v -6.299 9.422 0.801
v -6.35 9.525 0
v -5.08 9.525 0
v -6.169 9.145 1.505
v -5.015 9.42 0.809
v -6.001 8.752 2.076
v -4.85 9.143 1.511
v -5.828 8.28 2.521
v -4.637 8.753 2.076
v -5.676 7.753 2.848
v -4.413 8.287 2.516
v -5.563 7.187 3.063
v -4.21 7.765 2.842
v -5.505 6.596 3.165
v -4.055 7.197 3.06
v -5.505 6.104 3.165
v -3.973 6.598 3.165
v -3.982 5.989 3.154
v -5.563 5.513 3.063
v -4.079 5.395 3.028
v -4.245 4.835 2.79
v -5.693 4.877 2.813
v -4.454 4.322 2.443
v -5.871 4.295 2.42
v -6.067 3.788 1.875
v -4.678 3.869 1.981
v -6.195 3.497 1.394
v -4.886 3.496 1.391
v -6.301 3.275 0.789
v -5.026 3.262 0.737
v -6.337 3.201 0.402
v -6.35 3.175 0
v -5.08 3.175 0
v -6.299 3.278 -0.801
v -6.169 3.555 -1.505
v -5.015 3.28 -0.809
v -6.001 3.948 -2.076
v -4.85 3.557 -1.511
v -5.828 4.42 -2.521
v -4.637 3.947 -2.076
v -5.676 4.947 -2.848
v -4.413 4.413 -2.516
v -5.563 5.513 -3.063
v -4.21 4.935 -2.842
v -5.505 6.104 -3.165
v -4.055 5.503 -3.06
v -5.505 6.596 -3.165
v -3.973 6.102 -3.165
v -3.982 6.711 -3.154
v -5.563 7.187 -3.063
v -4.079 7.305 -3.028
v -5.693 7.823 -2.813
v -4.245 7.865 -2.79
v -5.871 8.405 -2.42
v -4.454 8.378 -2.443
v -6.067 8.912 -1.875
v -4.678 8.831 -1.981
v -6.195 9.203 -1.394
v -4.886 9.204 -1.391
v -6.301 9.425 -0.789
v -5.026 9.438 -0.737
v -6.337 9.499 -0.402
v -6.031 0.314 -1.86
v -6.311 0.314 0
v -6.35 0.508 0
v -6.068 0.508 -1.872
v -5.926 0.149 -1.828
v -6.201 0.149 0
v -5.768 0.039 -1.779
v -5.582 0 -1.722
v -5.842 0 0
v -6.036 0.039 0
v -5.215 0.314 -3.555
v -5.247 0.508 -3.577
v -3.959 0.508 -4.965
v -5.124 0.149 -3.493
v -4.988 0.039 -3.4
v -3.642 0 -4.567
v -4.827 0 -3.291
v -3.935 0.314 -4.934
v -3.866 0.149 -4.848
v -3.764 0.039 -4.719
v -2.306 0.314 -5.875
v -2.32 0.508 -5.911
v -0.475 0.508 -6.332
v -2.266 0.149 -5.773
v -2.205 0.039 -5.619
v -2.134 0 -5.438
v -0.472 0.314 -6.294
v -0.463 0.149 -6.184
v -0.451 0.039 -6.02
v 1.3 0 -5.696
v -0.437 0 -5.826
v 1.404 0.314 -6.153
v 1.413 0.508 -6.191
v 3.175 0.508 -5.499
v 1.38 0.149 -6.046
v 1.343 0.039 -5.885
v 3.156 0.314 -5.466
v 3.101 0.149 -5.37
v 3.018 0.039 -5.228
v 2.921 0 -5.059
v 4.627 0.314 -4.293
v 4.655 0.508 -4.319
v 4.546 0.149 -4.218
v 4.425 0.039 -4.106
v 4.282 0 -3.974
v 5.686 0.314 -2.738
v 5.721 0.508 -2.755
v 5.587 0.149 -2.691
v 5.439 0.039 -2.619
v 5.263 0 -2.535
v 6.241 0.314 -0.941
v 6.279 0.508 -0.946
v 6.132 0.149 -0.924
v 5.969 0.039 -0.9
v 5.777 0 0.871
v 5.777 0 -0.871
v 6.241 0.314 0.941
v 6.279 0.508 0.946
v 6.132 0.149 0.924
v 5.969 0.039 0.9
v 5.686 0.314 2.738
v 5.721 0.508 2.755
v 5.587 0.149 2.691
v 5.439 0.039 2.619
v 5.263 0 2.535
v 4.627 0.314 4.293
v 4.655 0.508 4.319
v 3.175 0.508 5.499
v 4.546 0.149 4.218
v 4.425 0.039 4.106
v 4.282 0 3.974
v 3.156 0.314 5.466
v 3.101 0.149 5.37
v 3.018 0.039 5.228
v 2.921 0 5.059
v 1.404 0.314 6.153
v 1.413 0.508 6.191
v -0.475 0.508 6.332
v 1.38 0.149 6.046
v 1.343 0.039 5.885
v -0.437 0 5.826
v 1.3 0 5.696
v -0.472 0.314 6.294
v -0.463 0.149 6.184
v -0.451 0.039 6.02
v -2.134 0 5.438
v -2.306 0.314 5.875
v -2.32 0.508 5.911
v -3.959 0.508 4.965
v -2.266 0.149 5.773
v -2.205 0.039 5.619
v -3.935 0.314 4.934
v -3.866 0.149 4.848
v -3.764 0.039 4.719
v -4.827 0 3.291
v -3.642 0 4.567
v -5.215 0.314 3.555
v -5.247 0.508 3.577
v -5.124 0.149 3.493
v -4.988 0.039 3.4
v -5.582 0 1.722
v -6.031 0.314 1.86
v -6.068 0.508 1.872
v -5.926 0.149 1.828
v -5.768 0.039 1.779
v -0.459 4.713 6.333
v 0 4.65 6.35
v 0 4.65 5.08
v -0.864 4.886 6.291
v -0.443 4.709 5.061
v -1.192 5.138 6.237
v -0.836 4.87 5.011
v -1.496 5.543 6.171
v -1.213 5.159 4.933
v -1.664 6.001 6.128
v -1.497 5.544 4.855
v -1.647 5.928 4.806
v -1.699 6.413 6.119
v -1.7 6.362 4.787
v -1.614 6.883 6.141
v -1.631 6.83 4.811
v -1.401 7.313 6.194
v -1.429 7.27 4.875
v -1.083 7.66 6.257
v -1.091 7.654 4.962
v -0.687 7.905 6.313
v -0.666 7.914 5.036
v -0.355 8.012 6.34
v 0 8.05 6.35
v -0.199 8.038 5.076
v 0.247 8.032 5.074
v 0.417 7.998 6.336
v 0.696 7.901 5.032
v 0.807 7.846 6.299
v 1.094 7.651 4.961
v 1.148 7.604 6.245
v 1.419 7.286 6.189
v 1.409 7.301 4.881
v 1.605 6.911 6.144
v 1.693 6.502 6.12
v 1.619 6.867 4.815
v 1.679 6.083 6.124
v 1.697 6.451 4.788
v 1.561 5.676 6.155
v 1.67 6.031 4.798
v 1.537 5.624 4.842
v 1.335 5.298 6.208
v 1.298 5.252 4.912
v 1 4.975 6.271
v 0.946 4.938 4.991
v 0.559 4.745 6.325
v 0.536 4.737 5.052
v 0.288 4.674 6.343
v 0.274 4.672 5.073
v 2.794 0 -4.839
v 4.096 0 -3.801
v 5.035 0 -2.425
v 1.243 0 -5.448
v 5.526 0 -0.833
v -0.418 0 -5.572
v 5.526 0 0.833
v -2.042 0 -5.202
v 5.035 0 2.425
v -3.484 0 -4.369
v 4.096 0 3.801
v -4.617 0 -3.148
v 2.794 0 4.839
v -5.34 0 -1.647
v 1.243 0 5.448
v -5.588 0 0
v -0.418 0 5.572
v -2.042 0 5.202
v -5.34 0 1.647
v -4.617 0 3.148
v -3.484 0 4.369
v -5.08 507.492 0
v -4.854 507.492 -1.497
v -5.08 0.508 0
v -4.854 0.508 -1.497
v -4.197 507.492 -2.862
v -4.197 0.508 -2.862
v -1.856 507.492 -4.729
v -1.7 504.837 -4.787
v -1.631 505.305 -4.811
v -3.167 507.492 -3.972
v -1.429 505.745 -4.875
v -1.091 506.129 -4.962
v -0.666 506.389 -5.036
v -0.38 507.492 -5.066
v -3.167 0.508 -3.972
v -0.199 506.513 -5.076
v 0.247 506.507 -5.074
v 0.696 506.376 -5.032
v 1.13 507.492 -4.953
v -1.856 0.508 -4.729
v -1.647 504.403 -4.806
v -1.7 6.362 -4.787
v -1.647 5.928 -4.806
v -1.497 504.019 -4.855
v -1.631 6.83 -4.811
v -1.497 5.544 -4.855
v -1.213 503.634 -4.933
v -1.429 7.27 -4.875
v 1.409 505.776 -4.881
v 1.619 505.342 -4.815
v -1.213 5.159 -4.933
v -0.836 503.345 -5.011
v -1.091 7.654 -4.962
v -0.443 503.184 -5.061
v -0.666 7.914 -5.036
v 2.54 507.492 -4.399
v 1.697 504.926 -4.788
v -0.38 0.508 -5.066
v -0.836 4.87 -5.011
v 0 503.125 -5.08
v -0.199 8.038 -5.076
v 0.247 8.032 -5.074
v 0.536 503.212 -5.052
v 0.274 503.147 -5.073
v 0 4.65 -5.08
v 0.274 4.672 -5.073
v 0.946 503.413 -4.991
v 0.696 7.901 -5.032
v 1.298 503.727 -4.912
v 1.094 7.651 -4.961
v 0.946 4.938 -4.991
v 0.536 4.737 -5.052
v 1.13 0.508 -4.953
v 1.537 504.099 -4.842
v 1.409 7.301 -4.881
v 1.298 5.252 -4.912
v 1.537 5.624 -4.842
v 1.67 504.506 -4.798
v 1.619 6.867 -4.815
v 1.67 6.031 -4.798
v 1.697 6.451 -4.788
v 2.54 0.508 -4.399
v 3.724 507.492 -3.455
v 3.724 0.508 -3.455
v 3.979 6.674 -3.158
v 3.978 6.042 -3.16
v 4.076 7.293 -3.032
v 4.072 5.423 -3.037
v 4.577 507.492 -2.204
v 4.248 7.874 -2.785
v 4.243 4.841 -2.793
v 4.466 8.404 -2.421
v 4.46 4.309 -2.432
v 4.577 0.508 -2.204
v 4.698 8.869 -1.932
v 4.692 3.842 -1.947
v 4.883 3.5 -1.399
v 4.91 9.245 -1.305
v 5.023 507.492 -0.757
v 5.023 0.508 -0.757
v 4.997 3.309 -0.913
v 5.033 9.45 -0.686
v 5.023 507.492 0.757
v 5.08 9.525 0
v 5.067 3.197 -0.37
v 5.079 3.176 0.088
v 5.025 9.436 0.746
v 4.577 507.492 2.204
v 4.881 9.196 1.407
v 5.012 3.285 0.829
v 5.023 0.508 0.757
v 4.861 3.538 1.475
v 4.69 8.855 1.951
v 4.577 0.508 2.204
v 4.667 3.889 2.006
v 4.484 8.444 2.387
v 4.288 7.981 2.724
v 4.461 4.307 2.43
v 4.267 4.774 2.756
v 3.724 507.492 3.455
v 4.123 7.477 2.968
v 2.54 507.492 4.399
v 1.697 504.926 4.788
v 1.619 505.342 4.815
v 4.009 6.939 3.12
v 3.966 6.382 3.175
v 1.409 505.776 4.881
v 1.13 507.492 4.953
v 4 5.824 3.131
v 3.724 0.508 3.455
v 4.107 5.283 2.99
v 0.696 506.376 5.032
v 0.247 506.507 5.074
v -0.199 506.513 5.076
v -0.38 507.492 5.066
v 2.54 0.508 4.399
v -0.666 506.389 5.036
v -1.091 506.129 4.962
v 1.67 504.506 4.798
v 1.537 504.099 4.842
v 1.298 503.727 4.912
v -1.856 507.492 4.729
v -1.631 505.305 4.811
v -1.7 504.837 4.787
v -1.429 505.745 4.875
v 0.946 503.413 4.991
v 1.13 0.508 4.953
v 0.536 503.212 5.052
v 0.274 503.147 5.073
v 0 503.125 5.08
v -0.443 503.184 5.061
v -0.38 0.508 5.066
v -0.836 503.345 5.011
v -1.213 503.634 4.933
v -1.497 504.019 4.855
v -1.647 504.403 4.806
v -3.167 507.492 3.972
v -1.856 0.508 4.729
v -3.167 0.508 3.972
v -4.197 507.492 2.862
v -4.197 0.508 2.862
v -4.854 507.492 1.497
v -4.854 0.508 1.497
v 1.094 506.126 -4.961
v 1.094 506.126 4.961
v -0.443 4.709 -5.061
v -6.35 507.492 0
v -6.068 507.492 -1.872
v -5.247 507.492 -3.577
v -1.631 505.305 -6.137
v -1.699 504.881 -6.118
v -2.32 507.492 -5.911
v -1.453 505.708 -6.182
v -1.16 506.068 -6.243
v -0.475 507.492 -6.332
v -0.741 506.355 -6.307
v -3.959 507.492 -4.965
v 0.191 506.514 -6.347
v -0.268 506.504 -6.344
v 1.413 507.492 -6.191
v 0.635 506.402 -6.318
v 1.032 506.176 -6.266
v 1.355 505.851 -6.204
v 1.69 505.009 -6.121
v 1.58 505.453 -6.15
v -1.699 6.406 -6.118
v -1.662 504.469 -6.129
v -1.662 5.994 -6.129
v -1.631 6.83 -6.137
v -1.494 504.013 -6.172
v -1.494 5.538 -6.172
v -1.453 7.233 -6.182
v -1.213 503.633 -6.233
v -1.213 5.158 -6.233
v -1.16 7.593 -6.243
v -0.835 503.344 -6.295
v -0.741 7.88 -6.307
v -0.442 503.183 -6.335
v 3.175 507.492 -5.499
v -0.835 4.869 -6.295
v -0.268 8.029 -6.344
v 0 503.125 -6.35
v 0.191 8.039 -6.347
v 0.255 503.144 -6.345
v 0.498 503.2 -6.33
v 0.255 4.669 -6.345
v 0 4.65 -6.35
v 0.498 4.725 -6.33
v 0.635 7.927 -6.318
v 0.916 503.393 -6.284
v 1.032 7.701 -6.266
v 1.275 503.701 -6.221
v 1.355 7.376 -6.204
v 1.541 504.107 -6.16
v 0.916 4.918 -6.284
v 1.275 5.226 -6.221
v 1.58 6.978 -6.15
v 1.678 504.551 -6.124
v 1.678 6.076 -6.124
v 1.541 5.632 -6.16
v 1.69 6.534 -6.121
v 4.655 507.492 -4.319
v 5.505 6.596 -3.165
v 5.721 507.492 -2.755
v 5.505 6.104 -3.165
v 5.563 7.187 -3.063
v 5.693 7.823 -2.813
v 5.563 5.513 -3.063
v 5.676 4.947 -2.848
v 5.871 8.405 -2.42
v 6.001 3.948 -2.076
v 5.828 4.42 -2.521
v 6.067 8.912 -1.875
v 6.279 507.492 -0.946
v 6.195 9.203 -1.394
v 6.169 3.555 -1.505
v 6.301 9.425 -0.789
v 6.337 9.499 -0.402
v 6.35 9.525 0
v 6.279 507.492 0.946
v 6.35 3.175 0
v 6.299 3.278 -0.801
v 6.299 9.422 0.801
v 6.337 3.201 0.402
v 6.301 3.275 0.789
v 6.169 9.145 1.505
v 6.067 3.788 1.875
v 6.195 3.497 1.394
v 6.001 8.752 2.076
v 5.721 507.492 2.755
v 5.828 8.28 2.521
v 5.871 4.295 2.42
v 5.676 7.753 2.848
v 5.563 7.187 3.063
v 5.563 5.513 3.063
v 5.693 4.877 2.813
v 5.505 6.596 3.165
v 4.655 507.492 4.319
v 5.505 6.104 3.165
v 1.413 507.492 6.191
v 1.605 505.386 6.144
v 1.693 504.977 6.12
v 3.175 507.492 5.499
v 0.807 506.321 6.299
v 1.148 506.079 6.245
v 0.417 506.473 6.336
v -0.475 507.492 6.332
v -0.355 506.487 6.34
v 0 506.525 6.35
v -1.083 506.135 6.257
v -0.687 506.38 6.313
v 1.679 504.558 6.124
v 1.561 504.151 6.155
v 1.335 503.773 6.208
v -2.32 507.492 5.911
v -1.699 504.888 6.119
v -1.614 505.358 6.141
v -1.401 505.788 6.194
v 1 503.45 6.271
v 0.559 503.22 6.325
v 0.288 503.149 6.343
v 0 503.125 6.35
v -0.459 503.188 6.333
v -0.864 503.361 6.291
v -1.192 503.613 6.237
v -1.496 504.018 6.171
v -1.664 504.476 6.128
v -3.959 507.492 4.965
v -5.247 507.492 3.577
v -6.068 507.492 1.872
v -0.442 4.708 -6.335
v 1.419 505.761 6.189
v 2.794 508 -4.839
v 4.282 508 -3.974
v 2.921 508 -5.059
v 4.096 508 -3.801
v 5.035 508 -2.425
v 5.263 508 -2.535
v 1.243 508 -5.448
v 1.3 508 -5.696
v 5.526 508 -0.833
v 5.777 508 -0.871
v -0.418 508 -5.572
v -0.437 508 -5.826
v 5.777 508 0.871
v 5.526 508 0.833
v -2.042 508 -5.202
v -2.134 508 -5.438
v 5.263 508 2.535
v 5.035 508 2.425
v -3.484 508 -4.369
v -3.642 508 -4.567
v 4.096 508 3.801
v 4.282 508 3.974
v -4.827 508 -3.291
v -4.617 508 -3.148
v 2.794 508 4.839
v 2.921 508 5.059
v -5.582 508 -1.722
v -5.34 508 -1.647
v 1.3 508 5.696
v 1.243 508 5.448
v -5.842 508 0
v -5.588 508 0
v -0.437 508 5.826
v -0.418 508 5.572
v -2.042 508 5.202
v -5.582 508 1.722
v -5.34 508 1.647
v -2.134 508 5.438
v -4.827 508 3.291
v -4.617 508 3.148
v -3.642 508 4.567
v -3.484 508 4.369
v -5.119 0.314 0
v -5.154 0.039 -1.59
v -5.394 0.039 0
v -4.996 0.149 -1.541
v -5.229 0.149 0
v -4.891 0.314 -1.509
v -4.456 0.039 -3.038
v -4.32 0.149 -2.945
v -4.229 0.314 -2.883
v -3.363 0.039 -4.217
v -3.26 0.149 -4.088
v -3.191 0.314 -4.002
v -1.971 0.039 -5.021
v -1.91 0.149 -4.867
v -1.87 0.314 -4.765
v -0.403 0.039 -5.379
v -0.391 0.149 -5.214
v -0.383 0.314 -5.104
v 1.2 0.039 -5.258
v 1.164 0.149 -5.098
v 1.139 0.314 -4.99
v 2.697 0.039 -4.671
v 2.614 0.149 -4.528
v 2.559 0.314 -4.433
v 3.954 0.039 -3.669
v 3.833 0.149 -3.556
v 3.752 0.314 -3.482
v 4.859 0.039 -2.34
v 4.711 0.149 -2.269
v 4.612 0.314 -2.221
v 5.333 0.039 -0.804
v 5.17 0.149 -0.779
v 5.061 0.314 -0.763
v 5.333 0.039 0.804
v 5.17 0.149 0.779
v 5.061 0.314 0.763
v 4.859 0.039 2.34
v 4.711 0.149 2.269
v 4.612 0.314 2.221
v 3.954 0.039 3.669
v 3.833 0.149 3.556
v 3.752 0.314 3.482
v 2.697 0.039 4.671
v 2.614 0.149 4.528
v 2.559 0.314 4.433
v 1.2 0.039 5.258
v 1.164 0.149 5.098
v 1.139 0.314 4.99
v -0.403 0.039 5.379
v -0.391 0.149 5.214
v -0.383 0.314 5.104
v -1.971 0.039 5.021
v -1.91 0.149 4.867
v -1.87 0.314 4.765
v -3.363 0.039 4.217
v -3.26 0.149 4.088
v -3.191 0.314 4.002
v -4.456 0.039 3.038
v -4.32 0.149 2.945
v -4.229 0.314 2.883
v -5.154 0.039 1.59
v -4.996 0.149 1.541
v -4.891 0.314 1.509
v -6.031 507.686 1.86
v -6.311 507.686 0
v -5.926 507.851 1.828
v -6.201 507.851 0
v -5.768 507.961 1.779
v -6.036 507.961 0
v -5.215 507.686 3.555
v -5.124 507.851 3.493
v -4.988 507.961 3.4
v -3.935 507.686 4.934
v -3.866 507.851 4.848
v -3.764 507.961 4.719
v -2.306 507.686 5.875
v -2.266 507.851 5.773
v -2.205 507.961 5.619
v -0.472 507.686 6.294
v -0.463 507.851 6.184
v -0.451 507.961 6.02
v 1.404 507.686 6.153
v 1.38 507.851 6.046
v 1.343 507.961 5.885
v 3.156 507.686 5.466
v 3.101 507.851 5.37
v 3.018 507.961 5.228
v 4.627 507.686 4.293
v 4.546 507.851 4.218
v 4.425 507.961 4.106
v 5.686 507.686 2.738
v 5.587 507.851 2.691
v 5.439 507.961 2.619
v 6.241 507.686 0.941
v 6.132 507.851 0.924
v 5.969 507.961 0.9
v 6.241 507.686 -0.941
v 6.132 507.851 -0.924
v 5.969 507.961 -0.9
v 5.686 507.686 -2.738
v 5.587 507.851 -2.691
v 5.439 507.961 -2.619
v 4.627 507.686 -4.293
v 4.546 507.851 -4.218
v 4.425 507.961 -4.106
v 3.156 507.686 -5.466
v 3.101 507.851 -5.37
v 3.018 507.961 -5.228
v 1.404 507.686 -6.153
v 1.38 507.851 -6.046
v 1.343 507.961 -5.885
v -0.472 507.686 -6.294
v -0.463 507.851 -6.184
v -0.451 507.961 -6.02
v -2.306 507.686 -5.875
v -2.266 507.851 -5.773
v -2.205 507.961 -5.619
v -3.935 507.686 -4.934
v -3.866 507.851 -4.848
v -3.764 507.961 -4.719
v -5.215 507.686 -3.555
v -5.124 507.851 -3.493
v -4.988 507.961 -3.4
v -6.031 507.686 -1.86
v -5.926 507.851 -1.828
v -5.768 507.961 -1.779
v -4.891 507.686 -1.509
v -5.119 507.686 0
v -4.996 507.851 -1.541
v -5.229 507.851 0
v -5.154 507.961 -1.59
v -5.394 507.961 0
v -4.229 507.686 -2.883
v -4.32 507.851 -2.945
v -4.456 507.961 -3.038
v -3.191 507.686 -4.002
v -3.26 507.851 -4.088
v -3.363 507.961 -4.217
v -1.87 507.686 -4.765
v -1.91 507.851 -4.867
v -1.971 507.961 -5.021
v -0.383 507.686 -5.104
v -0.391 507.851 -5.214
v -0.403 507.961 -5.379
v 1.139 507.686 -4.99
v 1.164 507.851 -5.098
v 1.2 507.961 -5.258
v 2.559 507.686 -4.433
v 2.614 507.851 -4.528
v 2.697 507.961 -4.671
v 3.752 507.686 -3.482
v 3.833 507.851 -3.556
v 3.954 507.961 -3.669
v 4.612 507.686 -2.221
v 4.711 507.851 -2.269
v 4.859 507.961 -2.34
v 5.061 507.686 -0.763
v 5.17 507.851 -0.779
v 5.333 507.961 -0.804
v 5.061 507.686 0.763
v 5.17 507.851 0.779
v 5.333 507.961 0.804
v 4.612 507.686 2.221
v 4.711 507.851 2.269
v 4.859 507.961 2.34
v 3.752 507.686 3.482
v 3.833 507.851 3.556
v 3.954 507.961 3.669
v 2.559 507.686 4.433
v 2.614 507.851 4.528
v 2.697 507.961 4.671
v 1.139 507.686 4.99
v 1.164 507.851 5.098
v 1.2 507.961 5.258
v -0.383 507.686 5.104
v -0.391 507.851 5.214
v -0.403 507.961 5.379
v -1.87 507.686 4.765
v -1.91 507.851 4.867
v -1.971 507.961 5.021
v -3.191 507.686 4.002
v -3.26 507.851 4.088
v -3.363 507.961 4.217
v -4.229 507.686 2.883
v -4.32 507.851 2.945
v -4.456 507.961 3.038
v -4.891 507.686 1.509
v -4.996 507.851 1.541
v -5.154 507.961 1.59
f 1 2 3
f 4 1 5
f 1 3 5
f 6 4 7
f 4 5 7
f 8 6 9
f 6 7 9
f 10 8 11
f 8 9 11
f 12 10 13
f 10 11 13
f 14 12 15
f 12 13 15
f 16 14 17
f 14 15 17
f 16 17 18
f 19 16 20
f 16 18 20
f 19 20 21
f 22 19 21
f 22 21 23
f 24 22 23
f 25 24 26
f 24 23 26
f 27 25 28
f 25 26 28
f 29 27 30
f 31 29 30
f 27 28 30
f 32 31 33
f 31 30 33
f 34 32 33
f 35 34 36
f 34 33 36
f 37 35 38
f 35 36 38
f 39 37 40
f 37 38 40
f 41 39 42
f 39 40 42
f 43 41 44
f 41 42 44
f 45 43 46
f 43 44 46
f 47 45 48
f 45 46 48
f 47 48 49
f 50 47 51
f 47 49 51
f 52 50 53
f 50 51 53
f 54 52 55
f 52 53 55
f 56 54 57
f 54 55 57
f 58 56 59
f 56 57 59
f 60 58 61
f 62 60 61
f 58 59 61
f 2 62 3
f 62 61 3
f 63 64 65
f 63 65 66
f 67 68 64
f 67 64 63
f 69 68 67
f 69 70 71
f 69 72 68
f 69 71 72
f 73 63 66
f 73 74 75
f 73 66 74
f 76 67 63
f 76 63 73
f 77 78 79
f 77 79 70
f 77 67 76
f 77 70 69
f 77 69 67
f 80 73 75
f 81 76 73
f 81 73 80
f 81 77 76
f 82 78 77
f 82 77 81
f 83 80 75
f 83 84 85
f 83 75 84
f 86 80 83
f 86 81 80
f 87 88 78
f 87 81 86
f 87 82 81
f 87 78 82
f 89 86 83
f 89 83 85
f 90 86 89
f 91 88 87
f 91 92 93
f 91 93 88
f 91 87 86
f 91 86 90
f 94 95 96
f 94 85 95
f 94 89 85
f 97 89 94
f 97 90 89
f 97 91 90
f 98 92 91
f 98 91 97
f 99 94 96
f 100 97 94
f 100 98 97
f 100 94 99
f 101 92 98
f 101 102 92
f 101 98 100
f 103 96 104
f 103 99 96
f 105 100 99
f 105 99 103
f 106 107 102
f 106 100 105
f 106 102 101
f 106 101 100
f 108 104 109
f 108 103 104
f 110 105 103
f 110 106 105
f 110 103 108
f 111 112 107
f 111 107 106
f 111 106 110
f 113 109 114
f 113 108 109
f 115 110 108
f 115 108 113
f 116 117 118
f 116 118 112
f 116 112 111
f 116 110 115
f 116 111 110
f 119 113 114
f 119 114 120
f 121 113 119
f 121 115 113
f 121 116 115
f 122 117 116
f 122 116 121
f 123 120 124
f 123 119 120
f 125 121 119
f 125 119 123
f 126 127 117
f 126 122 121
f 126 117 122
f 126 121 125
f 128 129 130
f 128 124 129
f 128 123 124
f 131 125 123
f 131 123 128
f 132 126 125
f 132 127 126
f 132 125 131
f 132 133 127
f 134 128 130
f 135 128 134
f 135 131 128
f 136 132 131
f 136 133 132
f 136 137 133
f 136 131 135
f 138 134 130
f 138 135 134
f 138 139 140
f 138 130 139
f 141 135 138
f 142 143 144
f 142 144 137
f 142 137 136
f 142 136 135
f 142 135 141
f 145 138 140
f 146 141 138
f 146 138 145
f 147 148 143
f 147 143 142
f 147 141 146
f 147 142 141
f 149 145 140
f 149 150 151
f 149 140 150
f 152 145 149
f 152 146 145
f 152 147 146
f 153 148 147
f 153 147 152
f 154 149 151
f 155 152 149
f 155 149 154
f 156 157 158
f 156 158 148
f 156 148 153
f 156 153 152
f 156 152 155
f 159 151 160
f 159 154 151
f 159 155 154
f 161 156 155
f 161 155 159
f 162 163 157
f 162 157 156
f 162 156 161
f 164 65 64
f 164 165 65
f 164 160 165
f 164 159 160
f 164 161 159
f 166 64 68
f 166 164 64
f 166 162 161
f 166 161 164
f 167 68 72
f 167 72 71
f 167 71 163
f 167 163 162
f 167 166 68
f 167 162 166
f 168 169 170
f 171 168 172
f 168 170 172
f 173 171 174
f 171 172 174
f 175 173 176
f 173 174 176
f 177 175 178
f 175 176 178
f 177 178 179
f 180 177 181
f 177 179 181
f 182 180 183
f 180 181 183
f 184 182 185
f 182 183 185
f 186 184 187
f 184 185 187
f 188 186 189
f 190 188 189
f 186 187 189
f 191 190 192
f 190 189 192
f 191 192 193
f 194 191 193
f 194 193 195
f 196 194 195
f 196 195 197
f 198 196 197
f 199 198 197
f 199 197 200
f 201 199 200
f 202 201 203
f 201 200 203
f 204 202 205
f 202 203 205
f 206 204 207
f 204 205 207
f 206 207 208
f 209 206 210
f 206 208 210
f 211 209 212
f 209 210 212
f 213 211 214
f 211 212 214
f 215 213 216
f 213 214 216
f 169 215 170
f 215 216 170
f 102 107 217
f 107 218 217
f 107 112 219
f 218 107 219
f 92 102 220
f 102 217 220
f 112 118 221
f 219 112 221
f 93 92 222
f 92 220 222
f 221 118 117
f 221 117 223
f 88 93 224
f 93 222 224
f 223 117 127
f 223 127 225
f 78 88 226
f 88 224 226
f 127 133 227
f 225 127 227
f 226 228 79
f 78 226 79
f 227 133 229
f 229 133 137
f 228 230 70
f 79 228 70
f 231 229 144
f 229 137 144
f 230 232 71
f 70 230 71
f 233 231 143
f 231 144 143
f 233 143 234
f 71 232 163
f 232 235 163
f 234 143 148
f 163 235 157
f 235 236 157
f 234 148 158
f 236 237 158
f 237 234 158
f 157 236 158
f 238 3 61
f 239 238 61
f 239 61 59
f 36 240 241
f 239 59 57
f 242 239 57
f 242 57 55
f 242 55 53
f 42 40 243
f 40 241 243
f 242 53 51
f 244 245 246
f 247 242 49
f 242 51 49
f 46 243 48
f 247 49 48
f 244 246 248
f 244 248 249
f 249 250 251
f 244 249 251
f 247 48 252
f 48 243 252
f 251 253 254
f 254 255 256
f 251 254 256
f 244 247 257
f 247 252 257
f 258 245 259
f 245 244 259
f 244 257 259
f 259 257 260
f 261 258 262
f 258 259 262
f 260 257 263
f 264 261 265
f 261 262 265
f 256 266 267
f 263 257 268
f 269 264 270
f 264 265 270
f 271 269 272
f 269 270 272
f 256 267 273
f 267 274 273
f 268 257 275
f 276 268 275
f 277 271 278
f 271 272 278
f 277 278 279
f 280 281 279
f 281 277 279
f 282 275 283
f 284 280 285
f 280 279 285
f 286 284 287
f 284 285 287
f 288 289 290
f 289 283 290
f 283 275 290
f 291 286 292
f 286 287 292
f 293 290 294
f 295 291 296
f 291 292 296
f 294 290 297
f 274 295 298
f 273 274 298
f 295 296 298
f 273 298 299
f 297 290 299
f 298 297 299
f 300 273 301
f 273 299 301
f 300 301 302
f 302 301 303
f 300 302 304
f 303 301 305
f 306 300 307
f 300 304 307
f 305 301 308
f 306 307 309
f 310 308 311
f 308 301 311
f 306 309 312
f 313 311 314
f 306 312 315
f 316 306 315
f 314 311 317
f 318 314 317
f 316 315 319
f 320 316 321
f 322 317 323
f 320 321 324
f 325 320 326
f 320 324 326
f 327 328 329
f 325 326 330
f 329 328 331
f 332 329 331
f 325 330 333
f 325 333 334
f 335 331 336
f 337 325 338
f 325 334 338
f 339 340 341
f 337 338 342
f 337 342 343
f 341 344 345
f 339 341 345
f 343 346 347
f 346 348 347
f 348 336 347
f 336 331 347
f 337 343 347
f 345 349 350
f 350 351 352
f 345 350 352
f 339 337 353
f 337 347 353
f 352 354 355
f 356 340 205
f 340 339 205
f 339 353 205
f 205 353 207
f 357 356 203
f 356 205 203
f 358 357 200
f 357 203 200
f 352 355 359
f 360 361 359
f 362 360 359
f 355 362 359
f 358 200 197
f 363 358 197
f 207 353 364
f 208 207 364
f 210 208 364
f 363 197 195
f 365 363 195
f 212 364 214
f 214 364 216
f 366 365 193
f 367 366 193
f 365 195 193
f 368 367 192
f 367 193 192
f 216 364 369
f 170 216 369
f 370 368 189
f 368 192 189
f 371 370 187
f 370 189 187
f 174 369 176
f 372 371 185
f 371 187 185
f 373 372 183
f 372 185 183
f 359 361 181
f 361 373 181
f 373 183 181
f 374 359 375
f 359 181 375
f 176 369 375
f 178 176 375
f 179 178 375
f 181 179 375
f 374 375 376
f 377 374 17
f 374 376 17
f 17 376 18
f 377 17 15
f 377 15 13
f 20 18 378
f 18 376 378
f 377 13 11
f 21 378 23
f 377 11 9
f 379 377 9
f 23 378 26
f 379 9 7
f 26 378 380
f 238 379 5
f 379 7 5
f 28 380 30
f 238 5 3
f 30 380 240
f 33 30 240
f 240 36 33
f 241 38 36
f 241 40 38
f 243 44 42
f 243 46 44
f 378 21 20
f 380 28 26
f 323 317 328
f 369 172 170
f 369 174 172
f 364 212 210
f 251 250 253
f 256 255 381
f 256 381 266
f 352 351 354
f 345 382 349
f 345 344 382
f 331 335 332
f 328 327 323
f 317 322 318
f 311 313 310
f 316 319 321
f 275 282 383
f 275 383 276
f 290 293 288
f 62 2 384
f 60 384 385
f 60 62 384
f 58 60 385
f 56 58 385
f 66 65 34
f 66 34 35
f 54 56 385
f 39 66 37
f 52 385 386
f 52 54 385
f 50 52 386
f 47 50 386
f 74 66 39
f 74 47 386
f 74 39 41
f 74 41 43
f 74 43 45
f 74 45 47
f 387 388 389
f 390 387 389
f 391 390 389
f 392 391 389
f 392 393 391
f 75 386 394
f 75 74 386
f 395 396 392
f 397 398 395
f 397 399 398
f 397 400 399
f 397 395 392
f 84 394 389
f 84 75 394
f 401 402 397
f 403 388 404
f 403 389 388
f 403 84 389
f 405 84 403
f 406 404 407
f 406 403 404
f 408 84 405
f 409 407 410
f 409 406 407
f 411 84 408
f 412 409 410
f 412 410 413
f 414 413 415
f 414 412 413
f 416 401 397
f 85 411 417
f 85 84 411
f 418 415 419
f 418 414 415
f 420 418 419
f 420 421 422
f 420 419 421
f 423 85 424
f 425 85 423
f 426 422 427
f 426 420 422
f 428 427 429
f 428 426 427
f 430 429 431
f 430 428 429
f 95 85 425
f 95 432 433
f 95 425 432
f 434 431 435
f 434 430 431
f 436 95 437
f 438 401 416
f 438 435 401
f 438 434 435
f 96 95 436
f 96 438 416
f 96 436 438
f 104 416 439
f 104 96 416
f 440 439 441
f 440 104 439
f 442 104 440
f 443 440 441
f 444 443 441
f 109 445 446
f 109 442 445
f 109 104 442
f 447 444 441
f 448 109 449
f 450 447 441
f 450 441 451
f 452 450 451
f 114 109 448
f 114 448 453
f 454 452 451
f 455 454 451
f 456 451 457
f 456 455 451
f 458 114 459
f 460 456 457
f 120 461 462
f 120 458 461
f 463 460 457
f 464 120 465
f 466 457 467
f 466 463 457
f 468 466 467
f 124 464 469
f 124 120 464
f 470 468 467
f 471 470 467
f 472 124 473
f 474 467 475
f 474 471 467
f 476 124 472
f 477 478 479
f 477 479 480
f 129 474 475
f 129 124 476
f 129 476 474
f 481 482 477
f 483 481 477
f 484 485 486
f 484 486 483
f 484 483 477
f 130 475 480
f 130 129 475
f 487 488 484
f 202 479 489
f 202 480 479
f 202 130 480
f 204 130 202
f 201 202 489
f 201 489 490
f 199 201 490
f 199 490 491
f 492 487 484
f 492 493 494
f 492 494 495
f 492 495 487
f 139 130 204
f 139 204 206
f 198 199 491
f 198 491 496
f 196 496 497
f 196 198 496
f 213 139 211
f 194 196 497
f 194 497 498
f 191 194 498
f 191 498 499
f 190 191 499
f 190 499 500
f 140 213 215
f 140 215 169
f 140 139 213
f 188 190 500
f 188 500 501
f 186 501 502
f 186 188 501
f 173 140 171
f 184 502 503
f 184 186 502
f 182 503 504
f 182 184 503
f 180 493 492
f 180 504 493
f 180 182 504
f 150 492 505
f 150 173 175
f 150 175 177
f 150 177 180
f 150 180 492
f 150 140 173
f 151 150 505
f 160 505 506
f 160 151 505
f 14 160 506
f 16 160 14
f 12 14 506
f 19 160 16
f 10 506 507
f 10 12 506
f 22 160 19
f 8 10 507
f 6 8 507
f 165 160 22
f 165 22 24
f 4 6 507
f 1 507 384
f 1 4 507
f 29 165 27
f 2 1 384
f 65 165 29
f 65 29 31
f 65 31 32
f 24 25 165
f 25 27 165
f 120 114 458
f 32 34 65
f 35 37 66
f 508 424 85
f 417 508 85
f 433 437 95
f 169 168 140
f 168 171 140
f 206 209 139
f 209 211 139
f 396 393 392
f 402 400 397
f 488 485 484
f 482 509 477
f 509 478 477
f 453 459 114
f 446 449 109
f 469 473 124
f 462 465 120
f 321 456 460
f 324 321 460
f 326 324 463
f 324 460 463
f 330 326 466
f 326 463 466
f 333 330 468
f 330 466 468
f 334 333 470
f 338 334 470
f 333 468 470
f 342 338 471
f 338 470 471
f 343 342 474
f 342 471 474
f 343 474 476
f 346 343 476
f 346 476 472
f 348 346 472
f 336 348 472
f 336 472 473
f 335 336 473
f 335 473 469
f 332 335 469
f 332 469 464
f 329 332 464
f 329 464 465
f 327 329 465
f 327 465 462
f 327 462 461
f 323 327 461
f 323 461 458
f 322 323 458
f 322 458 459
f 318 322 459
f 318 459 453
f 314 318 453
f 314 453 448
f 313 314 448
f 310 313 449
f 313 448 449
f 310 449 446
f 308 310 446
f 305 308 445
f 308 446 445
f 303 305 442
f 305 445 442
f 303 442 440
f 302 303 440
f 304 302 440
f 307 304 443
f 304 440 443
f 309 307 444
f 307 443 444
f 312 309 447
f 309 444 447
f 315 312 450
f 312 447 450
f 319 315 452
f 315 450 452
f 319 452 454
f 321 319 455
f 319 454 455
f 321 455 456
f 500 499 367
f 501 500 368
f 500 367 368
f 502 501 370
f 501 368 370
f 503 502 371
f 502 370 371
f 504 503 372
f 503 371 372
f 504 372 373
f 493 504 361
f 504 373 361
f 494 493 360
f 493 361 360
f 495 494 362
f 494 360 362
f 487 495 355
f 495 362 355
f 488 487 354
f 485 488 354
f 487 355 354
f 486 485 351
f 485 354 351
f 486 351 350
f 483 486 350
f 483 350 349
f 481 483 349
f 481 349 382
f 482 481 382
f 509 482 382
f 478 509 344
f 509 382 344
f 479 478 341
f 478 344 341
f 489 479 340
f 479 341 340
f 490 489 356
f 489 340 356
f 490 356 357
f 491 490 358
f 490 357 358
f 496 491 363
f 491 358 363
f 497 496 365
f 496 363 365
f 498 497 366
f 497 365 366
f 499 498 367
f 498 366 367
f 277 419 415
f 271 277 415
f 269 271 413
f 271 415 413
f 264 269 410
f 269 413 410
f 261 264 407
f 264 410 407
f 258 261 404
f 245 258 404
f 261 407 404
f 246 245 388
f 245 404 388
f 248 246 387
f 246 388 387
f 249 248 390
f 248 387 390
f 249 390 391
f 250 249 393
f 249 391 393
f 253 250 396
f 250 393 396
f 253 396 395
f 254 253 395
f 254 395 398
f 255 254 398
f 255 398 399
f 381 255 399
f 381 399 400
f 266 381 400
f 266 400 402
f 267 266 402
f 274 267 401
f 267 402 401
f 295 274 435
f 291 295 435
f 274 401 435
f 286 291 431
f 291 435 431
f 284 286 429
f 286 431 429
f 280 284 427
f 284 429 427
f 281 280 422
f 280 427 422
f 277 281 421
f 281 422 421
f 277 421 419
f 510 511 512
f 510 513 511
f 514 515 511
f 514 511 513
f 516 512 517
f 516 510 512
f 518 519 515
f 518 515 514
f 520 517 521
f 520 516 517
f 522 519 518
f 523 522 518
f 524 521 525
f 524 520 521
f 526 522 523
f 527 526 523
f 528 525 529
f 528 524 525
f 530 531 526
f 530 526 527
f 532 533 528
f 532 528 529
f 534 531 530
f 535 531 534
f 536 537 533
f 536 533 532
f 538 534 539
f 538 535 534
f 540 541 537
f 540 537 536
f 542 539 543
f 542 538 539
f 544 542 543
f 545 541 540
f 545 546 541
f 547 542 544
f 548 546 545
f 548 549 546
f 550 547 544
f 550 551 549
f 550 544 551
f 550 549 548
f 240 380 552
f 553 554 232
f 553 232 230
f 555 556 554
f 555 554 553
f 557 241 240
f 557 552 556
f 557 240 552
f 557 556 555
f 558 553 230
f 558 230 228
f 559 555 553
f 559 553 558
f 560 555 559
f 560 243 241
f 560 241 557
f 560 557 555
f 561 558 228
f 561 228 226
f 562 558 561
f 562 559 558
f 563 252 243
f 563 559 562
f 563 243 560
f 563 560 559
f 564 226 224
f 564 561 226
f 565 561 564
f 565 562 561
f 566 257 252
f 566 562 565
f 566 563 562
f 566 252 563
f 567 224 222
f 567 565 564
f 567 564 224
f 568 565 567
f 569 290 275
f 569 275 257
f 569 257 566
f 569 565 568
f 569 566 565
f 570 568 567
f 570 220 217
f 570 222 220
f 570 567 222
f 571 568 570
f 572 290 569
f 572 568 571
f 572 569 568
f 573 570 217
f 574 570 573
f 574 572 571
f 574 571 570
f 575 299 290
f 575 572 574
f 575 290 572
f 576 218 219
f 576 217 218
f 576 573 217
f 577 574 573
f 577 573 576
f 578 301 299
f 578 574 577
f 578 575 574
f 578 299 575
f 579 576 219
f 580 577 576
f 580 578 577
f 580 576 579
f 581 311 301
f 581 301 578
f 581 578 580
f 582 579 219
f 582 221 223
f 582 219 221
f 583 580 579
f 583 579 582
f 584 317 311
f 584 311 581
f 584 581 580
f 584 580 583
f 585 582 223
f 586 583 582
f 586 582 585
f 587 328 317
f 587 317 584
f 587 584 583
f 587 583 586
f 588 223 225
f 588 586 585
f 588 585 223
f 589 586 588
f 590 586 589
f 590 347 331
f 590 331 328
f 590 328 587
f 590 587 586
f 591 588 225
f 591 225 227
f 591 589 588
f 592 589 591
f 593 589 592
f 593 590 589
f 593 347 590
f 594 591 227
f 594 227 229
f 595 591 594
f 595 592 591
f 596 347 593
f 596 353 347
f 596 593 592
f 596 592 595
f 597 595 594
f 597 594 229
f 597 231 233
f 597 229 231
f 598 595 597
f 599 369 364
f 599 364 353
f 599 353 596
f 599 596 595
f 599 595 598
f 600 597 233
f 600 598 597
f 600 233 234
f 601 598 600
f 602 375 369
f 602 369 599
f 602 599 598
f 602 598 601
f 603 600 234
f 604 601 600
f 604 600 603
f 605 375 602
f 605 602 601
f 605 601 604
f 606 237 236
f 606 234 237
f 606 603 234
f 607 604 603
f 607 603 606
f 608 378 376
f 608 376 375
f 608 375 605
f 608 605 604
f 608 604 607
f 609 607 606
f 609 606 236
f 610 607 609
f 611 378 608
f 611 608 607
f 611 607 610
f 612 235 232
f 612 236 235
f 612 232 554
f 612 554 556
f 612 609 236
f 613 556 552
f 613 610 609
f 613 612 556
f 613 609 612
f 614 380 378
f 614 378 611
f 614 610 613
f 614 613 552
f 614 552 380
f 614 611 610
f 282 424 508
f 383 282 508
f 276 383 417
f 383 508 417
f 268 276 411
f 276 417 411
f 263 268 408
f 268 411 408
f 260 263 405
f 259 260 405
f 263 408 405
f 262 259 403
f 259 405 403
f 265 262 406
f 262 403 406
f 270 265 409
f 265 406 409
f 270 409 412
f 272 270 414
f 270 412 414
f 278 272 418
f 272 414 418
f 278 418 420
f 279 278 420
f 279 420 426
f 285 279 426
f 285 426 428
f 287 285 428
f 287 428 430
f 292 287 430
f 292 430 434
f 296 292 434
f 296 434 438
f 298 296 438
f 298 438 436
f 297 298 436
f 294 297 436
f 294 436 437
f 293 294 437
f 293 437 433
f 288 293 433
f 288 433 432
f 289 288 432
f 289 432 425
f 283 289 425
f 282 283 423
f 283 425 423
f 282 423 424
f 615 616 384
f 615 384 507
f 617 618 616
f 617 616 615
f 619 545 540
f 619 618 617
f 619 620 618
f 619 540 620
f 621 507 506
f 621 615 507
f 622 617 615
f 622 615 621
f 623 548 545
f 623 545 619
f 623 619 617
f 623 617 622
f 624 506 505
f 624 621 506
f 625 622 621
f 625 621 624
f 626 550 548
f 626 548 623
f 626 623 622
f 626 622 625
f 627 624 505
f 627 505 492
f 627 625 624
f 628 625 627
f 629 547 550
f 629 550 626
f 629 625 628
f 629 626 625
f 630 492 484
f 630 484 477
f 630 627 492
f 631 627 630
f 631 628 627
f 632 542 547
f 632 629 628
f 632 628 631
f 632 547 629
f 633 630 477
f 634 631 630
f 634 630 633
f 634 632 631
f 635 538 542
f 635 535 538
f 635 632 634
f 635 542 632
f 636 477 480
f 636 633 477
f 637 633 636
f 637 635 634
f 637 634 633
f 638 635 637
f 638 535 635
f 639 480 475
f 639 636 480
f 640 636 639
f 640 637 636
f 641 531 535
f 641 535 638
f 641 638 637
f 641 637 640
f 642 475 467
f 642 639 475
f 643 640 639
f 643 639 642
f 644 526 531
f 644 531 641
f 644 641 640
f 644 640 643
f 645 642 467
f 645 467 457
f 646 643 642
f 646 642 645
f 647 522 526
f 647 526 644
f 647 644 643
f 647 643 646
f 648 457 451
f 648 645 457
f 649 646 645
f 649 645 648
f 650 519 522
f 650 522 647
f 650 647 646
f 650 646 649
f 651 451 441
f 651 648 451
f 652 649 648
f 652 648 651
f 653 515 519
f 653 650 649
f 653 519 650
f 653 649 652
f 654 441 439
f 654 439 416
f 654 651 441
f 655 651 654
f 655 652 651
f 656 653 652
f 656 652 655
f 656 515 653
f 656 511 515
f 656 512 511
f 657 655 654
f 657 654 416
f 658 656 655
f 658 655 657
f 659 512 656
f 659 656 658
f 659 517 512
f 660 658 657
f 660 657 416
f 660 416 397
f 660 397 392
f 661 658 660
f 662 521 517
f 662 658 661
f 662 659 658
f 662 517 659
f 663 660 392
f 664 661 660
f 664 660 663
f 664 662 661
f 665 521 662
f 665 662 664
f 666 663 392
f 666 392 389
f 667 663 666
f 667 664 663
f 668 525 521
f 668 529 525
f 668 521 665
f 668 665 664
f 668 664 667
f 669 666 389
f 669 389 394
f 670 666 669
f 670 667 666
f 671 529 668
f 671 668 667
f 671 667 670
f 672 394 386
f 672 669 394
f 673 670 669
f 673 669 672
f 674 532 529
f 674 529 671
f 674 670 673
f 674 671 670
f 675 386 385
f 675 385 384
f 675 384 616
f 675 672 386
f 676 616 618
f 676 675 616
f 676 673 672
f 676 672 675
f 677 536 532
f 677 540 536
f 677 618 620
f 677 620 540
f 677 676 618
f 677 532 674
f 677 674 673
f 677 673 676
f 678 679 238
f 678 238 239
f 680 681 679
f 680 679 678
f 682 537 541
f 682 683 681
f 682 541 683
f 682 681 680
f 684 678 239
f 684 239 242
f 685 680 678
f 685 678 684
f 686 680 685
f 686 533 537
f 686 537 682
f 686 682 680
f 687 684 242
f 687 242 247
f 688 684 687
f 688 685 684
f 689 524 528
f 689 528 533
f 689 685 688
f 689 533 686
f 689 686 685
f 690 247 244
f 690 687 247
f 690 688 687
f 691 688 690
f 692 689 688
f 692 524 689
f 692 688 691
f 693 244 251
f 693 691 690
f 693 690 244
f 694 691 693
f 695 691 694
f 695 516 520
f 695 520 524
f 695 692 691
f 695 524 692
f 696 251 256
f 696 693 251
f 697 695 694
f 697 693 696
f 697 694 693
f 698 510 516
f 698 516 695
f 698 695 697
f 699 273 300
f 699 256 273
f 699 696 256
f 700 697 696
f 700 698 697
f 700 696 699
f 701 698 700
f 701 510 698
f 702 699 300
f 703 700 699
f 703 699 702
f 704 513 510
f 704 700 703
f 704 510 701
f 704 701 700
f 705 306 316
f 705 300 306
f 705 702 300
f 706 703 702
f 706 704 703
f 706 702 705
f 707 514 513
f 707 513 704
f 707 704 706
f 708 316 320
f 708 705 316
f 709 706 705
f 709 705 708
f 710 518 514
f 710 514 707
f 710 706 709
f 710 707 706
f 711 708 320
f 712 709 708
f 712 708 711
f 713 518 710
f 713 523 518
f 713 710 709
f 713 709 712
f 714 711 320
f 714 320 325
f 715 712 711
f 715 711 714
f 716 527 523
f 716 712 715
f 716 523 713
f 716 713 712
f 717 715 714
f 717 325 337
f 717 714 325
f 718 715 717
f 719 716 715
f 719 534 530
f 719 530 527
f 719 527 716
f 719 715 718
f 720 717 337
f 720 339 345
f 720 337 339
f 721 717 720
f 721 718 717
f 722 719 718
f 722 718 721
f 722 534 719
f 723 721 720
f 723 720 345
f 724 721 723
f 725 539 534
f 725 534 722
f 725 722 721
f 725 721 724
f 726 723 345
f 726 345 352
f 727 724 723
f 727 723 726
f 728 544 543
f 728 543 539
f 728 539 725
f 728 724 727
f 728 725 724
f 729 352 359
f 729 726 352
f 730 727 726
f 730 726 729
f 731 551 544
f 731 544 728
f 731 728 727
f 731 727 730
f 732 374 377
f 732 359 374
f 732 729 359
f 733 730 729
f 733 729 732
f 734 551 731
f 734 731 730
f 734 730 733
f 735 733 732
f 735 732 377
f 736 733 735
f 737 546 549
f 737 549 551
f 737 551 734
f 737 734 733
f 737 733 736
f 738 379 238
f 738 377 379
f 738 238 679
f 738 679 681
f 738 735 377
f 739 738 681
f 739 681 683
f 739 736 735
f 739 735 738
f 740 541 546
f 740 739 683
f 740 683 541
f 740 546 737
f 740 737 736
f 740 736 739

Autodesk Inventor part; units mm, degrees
ref_plane "XZ Plane" through (0, 0, 0) normal (0, 1, 0) x (-1, 0, 0)
sketch "Sketch1" plane through (0, 0, 0) normal (0, 1, 0) x (-1, 0, 0)
  circle A0 centre (0, 0) radius 6.35
  circle A1 centre (0, 0) radius 5.08
  dimension "d0" = 12.7
  dimension "d1" = 1.27
extrude "Extrusion1" add sketch "Sketch1" along normal blind 508
fillet "Fillet1" radius 0.508 2 edges at (6.35, 508, 0) (5.08, 508, 0)
fillet "Fillet2" radius 0.508 2 edges at (6.35, 0, 0) (5.08, 0, 0)
ref_plane "Work Plane1" through (6.35, 0, 0) normal (1, 0, 0) x (0, 1, 0)
sketch "Sketch2" plane through (6.35, 0, 0) normal (1, 0, 0) x (0, 1, 0)
  circle A0 centre (6.35, 0) radius 3.175
  point P0 (0, 0)
  dimension "d7" = 6.35
  dimension "d8" = 6.35
extrude "Extrusion2" cut sketch "Sketch2" against normal blind 25.4
ref_plane "Work Plane2" through (0, 0, 6.35) normal (0, 0, 1) x (1, 0, 0)
sketch "Sketch3" plane through (0, 0, 6.35) normal (0, 0, 1) x (1, 0, 0)
  circle A0 centre (0, 6.35) radius 0.6302
  point P0 (0, 0)
  dimension "d12" = 6.35
hole "Hole1" at (0, 6.35, 6.35) direction (0, 0, -1) diameter 3.4 depth 25.4 tip angle 118 clearance for "Socket Head Cap Screw" size "M3" standard "Ansi Metric M Profile"
sketch "Sketch5" plane through (0, 0, 6.35) normal (0, 0, 1) x (1, 0, 0)
  circle A0 centre (0, 504.825) radius 3.0853
  line L0 (-5.842, 508) -> (5.842, 508) projected
  point P0 (0, 0)
  dimension "d20" = 3.175
hole "Hole2" at (0, 504.825, 6.35) direction (0, 0, -1) diameter 3.4 depth 25.4 tip angle 118 clearance for "Socket Head Cap Screw" size "M3" standard "Ansi Metric M Profile"
properties part number "Pendulum Tubing"
